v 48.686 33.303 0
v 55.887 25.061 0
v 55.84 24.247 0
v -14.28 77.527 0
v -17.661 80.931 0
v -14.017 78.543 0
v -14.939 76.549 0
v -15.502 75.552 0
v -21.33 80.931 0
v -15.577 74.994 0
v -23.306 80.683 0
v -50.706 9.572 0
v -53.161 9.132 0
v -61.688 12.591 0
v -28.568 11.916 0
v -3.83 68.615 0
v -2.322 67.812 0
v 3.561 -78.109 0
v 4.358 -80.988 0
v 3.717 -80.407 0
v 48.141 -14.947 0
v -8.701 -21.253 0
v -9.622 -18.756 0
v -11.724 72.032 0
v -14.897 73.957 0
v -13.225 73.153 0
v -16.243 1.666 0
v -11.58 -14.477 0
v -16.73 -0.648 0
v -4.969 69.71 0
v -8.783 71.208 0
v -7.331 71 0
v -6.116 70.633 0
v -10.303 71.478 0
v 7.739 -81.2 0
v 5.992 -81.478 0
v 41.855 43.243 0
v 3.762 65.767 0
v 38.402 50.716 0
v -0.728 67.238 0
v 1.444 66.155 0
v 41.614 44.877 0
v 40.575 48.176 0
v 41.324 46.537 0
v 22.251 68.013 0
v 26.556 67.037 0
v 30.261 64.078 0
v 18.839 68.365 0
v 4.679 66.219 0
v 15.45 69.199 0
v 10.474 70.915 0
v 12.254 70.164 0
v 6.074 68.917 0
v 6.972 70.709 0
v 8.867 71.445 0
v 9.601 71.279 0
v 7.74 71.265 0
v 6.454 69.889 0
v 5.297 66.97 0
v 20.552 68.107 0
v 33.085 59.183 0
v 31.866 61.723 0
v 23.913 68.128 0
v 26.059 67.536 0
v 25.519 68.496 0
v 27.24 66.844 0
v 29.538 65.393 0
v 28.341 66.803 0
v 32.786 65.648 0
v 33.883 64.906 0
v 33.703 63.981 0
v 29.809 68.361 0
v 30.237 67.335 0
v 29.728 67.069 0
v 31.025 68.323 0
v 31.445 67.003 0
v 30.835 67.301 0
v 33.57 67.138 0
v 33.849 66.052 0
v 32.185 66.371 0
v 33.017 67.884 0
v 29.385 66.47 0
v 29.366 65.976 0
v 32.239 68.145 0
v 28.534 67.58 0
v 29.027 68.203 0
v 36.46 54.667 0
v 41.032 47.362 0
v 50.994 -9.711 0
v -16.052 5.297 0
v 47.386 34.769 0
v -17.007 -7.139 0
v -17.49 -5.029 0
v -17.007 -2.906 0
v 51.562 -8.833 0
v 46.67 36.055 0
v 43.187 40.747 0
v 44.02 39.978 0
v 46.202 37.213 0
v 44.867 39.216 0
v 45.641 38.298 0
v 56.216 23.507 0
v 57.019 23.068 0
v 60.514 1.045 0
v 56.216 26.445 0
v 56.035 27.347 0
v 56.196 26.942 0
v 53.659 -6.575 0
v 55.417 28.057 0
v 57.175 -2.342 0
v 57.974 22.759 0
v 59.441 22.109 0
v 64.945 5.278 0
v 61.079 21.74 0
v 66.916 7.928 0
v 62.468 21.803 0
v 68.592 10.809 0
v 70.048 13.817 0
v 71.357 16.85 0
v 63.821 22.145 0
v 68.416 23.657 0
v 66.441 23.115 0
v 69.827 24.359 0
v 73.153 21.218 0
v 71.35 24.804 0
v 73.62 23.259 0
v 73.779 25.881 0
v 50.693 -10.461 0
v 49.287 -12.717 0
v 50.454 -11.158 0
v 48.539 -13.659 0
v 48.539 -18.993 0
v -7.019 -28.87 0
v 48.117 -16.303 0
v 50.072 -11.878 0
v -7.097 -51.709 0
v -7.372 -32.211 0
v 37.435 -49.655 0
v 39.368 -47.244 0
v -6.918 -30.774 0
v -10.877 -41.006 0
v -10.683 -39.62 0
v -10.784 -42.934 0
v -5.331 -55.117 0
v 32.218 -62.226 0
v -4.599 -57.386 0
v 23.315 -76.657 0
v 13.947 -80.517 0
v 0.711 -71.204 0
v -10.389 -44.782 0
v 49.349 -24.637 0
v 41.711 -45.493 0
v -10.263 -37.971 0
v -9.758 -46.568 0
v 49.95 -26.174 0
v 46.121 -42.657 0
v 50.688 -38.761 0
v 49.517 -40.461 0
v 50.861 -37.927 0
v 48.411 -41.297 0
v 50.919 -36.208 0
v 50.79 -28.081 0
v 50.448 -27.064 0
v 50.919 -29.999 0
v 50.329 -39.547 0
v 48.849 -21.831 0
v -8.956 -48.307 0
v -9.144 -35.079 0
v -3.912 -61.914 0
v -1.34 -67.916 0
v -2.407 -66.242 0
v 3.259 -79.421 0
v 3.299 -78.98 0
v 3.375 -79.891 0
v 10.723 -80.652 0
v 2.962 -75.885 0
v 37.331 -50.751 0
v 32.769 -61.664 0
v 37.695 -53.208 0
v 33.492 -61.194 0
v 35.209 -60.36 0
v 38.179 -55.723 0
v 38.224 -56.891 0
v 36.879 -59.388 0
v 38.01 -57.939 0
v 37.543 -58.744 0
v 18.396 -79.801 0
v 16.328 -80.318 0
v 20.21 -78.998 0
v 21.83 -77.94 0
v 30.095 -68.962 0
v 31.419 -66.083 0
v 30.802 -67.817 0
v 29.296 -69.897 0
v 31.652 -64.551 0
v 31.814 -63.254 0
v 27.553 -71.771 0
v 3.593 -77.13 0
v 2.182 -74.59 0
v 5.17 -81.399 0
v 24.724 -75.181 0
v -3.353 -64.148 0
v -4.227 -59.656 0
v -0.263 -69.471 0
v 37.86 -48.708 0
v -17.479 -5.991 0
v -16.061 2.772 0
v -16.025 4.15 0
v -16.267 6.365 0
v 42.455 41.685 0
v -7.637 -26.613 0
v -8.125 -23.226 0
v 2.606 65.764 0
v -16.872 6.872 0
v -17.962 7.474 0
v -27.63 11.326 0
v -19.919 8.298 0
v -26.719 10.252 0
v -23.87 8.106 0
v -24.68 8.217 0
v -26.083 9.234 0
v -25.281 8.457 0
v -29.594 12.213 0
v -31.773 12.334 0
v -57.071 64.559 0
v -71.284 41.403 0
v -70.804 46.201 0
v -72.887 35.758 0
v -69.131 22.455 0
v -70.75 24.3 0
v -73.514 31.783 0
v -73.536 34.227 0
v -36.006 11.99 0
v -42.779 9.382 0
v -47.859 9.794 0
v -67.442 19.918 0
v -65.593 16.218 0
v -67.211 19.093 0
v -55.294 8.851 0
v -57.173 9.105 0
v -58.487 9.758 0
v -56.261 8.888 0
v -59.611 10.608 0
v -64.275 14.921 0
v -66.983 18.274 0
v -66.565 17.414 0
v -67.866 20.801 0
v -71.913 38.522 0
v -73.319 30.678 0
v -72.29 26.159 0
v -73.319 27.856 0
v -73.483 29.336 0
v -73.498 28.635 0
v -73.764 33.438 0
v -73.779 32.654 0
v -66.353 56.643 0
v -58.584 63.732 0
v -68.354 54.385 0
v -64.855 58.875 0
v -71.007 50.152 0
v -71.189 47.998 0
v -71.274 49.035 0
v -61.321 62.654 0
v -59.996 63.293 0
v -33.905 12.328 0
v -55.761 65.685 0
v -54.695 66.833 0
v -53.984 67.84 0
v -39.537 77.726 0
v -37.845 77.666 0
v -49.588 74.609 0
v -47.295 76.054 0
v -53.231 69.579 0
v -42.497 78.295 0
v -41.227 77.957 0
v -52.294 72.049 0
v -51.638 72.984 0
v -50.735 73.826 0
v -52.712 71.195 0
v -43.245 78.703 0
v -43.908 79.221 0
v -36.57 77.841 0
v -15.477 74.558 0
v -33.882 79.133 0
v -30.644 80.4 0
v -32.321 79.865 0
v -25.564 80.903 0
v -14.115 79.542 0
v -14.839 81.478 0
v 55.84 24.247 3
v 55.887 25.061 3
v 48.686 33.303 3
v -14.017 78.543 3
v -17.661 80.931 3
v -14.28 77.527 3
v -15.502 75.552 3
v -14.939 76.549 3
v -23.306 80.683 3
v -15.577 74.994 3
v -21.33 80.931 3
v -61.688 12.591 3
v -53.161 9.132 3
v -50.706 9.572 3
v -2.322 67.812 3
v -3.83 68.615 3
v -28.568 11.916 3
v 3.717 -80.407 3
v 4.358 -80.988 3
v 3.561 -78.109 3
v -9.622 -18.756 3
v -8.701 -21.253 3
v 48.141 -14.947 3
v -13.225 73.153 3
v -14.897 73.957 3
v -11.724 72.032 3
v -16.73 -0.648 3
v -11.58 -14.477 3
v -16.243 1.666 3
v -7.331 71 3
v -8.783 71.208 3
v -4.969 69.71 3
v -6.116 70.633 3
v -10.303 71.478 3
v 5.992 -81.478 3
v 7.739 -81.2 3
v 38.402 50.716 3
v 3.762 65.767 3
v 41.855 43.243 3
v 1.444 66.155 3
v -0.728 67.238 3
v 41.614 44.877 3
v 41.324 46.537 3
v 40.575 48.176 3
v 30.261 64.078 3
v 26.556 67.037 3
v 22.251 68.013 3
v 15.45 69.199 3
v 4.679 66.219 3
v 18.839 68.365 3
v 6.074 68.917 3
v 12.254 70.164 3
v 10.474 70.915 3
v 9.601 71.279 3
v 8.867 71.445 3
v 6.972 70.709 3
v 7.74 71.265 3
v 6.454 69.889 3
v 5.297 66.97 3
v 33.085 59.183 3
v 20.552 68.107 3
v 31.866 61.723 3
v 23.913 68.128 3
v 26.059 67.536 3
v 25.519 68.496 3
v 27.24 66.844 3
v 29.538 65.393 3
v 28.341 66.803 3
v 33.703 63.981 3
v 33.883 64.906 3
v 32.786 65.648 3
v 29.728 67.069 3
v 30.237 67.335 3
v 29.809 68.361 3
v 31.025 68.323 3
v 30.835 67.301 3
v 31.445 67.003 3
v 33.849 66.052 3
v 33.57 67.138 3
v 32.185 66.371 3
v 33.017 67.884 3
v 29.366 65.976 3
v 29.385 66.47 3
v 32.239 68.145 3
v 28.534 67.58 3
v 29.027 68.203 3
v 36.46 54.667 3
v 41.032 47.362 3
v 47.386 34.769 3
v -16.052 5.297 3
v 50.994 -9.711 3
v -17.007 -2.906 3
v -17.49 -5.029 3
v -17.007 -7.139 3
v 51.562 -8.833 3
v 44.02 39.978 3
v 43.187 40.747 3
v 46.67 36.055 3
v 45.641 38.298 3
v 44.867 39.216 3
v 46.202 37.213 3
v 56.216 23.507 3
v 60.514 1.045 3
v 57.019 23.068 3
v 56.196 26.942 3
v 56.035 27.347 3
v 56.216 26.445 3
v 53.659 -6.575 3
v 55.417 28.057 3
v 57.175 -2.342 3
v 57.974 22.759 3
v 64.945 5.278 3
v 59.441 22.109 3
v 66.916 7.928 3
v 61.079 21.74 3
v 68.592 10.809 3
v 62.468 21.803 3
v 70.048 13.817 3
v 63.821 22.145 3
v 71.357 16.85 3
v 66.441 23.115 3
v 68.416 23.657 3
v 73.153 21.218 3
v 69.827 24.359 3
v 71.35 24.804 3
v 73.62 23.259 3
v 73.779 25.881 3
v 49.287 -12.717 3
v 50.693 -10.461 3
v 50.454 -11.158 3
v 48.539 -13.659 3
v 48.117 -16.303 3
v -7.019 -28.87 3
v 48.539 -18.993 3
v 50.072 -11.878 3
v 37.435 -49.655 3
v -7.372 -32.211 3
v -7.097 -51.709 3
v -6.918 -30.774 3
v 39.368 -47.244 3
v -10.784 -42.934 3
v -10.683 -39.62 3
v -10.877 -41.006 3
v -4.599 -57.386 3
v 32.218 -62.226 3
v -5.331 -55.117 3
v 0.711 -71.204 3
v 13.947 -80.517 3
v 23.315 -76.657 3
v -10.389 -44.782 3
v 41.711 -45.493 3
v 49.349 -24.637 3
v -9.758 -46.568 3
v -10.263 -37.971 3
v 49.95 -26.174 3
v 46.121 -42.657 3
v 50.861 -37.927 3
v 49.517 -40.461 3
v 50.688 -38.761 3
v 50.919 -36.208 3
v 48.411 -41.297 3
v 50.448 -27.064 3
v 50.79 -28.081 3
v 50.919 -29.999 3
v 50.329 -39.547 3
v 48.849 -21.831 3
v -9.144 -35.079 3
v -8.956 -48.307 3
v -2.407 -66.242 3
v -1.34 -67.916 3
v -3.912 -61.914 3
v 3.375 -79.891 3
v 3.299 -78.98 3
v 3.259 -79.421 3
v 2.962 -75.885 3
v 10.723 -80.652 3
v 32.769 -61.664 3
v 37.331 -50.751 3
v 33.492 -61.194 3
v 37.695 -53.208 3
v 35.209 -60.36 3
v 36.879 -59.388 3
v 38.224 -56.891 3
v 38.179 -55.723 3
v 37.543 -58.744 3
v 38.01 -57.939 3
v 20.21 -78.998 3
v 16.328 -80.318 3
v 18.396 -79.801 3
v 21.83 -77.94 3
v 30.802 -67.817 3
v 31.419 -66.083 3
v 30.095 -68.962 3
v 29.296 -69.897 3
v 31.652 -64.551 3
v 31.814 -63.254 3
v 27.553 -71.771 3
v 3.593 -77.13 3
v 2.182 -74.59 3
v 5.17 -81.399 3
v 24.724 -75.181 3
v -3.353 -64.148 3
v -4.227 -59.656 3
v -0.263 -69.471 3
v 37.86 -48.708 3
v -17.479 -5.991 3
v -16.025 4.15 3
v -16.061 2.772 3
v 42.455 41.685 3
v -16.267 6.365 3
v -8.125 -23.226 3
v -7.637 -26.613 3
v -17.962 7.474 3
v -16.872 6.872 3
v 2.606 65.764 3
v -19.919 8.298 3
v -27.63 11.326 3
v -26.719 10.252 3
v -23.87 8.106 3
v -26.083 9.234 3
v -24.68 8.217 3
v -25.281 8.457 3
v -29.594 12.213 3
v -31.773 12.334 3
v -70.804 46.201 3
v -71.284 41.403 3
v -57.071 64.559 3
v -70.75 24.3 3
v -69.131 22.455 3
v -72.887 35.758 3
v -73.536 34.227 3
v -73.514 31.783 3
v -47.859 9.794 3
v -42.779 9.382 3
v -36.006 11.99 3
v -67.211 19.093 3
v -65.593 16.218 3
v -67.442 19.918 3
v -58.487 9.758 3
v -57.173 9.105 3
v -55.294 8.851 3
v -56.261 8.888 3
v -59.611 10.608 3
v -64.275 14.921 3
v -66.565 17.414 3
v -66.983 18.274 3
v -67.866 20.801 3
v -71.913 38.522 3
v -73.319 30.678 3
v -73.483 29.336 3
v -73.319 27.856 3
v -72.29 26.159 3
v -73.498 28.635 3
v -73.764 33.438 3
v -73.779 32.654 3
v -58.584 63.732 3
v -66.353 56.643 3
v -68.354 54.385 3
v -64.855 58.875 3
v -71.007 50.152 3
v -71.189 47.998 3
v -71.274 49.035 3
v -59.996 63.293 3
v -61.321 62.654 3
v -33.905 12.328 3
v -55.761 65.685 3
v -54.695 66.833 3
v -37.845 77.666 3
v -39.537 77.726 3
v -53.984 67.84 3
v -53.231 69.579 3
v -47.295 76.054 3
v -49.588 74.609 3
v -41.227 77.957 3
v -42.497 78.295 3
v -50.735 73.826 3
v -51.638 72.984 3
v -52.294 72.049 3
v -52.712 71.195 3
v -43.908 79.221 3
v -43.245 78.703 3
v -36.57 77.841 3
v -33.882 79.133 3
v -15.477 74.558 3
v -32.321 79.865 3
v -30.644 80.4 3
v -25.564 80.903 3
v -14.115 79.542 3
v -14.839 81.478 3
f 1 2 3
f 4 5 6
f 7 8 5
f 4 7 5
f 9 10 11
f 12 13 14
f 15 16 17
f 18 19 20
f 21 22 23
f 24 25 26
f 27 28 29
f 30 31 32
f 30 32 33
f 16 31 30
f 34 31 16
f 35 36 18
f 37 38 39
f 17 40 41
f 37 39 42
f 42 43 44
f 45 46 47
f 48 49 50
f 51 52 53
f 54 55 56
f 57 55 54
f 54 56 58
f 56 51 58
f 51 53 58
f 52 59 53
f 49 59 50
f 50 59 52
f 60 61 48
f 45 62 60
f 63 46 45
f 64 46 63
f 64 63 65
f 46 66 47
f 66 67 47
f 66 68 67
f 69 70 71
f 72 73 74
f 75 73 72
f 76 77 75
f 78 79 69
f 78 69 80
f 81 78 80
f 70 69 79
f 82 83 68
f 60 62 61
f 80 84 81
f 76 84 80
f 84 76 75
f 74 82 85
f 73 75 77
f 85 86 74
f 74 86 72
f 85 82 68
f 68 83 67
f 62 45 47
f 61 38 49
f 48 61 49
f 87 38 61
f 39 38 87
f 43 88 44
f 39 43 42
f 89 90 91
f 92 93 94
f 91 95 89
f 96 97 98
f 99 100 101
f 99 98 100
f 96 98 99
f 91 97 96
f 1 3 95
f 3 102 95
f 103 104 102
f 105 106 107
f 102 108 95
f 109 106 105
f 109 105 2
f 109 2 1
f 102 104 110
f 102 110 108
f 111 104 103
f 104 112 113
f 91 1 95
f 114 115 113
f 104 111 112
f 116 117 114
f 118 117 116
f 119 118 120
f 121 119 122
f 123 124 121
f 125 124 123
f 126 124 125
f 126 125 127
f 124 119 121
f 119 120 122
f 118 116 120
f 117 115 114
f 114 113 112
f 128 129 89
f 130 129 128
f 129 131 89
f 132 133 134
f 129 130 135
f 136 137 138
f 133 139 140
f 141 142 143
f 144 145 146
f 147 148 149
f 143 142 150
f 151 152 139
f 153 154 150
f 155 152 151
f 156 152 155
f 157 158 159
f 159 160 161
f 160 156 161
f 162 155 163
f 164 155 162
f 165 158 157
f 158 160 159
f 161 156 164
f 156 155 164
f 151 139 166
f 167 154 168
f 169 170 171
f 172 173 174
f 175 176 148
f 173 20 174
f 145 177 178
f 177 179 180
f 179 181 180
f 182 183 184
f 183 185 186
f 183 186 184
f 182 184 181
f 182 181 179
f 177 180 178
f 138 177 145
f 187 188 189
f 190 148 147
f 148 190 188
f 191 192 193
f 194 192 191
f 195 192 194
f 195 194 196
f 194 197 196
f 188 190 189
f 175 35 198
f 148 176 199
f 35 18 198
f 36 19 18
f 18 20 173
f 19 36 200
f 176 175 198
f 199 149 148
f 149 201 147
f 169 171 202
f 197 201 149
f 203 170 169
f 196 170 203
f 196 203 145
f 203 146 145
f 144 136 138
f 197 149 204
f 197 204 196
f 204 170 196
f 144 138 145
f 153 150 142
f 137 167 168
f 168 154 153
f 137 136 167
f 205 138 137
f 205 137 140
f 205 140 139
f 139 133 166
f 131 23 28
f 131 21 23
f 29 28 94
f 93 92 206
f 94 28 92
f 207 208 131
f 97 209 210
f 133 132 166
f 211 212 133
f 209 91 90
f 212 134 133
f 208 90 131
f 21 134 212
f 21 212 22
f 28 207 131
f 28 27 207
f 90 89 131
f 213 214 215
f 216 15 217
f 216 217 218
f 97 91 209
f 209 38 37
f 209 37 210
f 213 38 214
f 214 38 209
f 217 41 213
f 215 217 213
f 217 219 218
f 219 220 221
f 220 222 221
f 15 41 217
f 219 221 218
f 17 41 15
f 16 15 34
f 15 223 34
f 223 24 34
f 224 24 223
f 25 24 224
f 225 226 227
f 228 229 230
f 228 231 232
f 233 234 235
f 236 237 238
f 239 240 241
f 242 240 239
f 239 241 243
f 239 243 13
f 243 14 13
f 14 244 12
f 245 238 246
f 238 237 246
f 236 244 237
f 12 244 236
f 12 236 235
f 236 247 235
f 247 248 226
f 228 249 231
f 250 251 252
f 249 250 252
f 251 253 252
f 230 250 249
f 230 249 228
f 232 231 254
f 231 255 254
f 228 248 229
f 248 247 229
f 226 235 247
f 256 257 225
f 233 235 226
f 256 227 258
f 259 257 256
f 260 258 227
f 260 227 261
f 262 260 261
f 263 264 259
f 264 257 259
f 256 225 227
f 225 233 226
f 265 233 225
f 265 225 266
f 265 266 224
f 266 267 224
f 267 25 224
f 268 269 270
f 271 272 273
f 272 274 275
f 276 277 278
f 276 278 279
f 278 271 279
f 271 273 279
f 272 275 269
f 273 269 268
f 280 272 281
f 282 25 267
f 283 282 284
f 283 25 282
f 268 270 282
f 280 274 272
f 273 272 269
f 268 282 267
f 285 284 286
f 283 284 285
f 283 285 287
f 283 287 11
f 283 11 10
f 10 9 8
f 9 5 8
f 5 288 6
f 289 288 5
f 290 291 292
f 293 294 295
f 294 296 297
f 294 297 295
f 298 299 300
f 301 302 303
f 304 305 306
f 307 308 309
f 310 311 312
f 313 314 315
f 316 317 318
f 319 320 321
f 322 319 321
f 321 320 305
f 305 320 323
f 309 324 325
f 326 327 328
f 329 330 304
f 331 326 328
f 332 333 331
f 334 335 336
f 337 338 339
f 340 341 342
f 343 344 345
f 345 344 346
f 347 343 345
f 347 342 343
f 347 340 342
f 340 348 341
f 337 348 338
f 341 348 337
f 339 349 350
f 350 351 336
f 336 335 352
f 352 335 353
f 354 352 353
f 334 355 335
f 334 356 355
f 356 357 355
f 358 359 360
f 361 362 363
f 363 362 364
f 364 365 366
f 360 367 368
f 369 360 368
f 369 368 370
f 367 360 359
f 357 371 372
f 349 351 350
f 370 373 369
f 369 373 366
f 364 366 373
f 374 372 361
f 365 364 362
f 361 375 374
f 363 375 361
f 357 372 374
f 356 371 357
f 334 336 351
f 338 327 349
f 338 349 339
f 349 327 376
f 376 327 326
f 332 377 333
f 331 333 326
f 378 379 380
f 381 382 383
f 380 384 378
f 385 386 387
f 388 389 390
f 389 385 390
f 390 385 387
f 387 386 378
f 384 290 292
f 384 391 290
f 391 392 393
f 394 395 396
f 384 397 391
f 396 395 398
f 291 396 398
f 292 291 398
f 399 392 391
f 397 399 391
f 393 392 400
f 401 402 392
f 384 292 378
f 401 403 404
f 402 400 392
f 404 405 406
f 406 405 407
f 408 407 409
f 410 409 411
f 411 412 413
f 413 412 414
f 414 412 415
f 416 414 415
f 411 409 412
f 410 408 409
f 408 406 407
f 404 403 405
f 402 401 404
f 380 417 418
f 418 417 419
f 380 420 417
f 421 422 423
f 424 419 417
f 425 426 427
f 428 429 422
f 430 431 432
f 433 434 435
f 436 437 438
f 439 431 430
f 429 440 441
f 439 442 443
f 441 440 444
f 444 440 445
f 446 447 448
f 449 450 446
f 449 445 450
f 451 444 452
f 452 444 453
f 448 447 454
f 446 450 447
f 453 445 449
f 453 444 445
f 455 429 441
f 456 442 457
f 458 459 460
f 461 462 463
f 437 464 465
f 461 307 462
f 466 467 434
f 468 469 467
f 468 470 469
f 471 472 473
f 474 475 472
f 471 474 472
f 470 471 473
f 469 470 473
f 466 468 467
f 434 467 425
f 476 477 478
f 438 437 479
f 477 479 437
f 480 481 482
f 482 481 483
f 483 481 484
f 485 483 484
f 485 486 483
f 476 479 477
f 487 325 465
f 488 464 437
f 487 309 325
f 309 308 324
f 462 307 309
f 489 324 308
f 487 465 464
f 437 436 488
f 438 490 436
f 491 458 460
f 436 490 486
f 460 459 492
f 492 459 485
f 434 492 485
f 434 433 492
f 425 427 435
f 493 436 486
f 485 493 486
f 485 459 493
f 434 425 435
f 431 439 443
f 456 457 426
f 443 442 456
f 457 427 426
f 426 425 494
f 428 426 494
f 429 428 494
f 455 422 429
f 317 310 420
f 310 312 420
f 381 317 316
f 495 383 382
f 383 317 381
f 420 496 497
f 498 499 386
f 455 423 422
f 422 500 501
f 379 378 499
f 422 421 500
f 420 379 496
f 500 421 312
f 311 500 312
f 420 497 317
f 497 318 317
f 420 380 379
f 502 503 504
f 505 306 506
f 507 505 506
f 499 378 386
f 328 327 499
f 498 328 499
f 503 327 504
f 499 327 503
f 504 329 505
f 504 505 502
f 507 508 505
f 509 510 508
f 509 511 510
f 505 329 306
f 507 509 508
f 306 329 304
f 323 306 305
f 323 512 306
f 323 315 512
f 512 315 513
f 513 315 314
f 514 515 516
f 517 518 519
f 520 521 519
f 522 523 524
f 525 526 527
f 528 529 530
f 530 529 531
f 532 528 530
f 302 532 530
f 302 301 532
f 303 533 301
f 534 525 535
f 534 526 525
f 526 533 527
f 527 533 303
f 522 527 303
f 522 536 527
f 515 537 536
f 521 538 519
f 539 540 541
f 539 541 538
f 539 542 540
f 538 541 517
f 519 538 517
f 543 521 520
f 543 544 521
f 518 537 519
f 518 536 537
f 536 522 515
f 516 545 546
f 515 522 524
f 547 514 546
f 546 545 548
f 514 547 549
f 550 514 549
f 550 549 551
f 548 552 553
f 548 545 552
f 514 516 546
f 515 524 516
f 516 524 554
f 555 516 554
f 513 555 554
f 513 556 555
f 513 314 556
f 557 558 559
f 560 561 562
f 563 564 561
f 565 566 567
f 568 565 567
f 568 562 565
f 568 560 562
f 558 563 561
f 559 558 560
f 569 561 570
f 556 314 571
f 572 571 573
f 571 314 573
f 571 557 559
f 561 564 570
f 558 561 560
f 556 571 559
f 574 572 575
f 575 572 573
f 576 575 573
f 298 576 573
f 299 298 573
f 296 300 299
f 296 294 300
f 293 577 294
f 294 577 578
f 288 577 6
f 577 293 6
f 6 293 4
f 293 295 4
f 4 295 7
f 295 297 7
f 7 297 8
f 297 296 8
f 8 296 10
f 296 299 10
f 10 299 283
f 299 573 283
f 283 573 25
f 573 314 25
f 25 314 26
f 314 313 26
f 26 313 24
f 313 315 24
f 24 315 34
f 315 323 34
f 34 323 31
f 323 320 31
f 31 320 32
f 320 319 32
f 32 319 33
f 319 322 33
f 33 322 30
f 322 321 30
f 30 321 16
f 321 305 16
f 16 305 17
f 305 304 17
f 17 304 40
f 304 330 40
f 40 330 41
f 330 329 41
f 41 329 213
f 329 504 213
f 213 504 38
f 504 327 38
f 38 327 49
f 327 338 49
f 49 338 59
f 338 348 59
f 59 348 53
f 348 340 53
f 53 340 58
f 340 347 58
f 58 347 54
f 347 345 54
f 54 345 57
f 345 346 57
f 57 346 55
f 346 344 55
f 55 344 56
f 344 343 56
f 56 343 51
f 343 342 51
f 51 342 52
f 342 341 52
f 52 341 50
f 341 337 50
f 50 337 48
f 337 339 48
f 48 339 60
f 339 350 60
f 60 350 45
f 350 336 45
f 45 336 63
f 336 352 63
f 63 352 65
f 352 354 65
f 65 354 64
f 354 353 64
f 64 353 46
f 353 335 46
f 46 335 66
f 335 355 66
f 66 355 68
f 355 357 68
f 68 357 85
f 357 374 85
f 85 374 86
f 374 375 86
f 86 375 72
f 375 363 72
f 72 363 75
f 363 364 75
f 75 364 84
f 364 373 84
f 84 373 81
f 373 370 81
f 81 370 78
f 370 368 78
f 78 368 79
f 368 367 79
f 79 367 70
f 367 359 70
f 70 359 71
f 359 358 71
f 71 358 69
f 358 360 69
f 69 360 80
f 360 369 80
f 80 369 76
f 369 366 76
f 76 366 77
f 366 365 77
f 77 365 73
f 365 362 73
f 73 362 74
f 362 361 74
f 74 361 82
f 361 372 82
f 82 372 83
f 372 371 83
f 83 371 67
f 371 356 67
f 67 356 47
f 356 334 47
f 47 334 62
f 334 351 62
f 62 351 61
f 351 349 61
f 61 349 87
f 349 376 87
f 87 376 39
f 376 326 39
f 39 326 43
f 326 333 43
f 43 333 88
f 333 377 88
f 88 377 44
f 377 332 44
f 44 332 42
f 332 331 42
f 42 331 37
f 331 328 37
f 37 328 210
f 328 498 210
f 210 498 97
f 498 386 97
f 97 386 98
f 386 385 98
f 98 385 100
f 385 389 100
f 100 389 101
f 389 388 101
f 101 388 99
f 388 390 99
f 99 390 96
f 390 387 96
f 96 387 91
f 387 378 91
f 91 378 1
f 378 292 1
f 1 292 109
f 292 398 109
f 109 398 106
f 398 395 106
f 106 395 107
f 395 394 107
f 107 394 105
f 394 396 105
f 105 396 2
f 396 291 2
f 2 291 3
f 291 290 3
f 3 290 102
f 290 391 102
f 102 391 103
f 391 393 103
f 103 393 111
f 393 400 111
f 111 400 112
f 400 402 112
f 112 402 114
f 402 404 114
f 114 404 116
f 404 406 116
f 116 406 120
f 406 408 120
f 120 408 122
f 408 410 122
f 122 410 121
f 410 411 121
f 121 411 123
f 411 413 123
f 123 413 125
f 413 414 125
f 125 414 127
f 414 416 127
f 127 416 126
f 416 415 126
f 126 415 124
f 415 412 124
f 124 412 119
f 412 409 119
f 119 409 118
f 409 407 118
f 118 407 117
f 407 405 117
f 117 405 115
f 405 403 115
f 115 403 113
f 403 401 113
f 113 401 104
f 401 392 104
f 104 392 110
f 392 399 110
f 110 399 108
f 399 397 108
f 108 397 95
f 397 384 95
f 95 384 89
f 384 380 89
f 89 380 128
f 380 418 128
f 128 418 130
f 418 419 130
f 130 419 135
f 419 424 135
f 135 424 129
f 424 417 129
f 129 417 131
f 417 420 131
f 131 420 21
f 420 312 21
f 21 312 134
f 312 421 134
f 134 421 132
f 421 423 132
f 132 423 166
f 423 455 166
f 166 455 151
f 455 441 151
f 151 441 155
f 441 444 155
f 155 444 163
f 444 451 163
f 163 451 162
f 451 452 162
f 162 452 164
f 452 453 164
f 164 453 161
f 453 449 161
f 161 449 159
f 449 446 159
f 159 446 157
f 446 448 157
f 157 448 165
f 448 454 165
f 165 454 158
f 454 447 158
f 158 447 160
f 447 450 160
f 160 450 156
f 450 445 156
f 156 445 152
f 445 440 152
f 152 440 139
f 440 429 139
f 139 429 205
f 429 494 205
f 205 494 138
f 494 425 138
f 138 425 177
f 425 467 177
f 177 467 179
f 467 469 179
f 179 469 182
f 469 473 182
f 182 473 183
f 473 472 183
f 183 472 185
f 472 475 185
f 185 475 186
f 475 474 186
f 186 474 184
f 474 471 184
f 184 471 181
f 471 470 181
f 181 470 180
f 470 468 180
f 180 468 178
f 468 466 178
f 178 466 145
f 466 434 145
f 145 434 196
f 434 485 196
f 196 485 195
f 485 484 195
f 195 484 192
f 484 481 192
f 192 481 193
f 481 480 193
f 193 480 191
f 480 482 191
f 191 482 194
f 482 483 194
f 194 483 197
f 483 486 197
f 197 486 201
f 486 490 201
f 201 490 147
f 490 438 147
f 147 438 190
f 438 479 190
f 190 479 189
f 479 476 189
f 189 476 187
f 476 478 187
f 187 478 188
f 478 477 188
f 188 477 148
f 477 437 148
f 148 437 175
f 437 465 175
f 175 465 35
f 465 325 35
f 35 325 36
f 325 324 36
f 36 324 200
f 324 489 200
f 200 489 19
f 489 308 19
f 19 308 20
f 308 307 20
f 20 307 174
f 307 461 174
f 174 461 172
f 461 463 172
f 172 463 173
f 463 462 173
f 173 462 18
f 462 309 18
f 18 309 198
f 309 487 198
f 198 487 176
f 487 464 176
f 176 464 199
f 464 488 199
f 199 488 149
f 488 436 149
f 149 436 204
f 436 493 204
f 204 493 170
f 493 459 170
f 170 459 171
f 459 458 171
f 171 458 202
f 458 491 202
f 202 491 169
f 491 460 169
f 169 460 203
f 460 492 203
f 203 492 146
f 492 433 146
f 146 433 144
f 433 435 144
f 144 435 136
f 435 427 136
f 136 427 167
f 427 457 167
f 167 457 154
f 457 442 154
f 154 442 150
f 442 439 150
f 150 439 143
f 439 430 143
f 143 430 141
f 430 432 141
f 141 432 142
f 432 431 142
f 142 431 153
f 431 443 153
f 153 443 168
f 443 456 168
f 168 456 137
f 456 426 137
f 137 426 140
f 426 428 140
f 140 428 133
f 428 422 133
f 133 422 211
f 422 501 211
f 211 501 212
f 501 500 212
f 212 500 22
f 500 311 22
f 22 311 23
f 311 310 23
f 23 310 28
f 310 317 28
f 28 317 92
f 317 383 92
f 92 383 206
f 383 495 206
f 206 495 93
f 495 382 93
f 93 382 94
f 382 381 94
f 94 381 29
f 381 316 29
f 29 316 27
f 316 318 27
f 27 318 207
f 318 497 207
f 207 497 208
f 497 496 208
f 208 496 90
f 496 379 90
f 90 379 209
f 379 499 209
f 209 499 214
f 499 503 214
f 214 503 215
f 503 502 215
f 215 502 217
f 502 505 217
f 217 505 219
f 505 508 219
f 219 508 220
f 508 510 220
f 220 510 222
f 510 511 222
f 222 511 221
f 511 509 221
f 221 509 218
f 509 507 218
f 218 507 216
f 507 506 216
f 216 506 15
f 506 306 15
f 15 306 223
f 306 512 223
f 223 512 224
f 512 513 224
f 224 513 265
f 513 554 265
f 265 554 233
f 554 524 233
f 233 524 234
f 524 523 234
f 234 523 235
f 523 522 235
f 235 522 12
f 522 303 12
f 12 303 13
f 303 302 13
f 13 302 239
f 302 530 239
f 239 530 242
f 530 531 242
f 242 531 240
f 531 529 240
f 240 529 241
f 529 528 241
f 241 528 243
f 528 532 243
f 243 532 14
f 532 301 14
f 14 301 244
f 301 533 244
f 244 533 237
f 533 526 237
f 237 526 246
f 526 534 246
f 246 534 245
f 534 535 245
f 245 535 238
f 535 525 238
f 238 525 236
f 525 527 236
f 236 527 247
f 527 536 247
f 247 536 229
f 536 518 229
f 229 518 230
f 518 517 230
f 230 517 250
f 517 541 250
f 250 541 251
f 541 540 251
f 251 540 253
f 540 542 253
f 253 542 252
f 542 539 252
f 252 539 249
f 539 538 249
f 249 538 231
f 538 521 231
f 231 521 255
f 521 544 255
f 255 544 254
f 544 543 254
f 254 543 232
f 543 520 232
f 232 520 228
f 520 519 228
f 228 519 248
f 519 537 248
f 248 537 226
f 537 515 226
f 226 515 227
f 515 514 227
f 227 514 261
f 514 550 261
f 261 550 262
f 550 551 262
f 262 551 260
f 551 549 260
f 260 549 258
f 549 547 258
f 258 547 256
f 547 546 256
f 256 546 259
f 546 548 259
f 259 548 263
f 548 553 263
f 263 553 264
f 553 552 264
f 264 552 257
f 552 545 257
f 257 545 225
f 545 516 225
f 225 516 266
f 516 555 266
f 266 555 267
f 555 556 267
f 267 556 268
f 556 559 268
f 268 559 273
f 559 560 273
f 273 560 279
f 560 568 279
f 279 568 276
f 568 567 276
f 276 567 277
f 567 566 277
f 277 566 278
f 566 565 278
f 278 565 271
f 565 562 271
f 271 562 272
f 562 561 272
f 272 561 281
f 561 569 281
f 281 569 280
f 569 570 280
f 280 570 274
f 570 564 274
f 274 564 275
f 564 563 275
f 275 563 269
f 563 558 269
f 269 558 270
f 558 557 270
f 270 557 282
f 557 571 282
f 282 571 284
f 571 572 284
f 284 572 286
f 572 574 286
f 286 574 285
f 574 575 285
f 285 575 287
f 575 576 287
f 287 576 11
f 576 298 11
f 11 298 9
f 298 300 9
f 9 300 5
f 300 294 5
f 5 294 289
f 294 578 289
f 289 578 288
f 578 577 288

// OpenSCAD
// Module names are of the form poly_<inkscape-path-id>().  As a result,
// you can associate a polygon in this OpenSCAD program with the corresponding
// SVG element in the Inkscape document by looking for the XML element with
// the attribute id="inkscape-path-id".



module africa(h=3)
{
  scale([25.4/90, -25.4/90, 1]) union()
  {
    linear_extrude(height=h)
      polygon([[-150.580000,-277.423125],[-146.079531,-276.225156],[-140.091250,-275.406875],[-134.097344,-275.194219],[-129.580000,-275.813125],[-120.055000,-280.393125],[-114.524688,-282.987813],[-108.580000,-284.883125],[-90.580000,-286.663125],[-82.580000,-285.883125],[-75.580000,-286.763125],[-62.580000,-286.763125],[-52.580000,-288.703125],[-50.015000,-281.841875],[-49.666250,-278.301094],[-50.600000,-274.703125],[-52.933750,-271.236875],[-54.930000,-267.703125],[-55.193555,-265.725156],[-54.839063,-264.181250],[-52.785000,-262.050625],[-46.860000,-259.203125],[-41.540000,-255.233125],[-36.507344,-253.268438],[-31.121250,-252.310625],[-25.977031,-251.574063],[-21.670000,-250.273125],[-17.605000,-247.005625],[-13.570000,-243.123125],[-8.228750,-240.278125],[-2.580000,-238.243125],[5.116250,-234.408125],[9.233906,-233.020312],[13.330000,-233.033125],[16.578496,-234.635938],[18.767969,-237.296250],[21.523750,-244.195625],[22.867012,-247.637813],[24.705156,-250.543750],[27.426660,-252.515000],[31.420000,-253.153125],[34.020625,-252.561875],[37.112500,-251.273125],[43.420000,-248.613125],[54.744844,-245.195000],[66.751250,-242.238125],[72.823418,-241.322891],[78.842031,-240.991250],[84.732441,-241.399297],[90.420000,-242.703125],[92.335469,-239.300469],[94.096250,-237.531875],[96.518906,-236.848906],[100.420000,-236.703125],[101.106250,-239.456875],[102.850000,-241.663125],[105.623281,-242.223437],[109.931250,-242.088125],[114.233594,-241.457812],[116.990000,-240.533125],[118.950313,-237.889844],[119.937500,-234.041875],[120.058437,-229.982031],[119.420000,-226.703125],[116.170000,-232.609375],[114.042500,-235.172969],[111.420000,-237.413125],[109.258437,-238.469219],[107.140000,-238.586875],[105.336562,-237.645156],[104.120000,-235.523125],[104.051445,-233.774590],[104.660937,-231.706719],[107.225000,-227.049375],[112.910000,-218.703125],[117.230000,-209.703125],[129.190000,-193.703125],[136.070000,-179.703125],[143.770000,-170.703125],[145.389180,-167.818691],[146.422187,-164.894531],[147.452500,-159.011875],[148.306562,-153.224844],[150.430000,-147.703125],[153.026562,-144.378281],[155.977500,-141.654375],[158.977187,-138.954844],[161.720000,-135.703125],[163.706875,-131.857500],[165.367500,-127.753125],[167.901875,-123.198750],[172.510000,-118.003125],[196.360000,-99.413125],[198.547500,-96.899375],[199.119062,-95.462969],[199.190000,-93.703125],[198.023750,-88.798125],[197.858281,-85.915312],[199.190000,-83.293125],[202.035000,-81.735625],[205.420000,-80.643125],[210.616250,-78.339375],[216.420000,-77.033125],[221.343438,-77.255469],[226.137500,-78.466875],[235.420000,-81.903125],[242.420000,-83.823125],[247.420000,-86.313125],[252.815000,-87.886875],[261.420000,-91.703125],[260.857031,-82.415469],[259.203750,-75.181875],[252.840000,-59.703125],[248.200156,-48.958594],[243.043750,-38.299375],[237.105469,-28.092031],[230.120000,-18.703125],[214.420000,-3.703125],[202.590000,8.296875],[190.130000,23.296875],[182.700000,31.296875],[180.686719,34.408750],[179.621250,37.066875],[178.775156,39.537500],[177.420000,42.086875],[174.637500,45.061875],[171.990000,48.396875],[170.576719,52.960156],[170.493750,57.768125],[171.990000,67.296875],[173.087500,77.353125],[174.860000,87.296875],[176.987344,92.743437],[178.753750,95.896875],[179.963281,99.500312],[180.420000,106.296875],[180.420000,128.296875],[180.215000,134.388125],[179.604375,137.343281],[178.330000,140.126875],[175.454687,143.364688],[171.535000,146.326875],[163.420000,151.146875],[147.795000,161.195625],[139.491250,167.401719],[134.150000,172.586875],[132.644941,175.943496],[132.273906,179.825469],[133.563750,188.533125],[135.279219,197.445156],[135.440215,201.582598],[134.680000,205.296875],[133.025547,208.148828],[130.675000,210.429375],[124.757500,213.874375],[118.671250,216.828125],[116.109766,218.494609],[114.160000,220.486875],[112.725937,224.129219],[112.152500,228.723125],[111.327812,234.151406],[109.140000,240.296875],[106.635625,244.352031],[103.805000,247.665625],[97.630000,254.306875],[87.605312,266.389844],[82.611602,271.620801],[77.350000,276.165625],[71.610273,279.914980],[65.182187,282.759531],[57.855508,284.589941],[49.420000,285.296875],[37.996250,285.775625],[27.420000,287.716875],[21.231250,288.703125],[18.320156,288.421406],[15.440000,286.966875],[13.171465,284.906621],[11.957969,283.077344],[11.547676,281.413770],[11.688750,279.850625],[12.617656,276.764531],[12.730000,273.296875],[10.496250,268.883125],[7.730000,264.296875],[2.520000,252.296875],[-0.930938,246.156094],[-4.747500,240.648125],[-8.530313,234.714531],[-11.880000,227.296875],[-13.862656,219.380312],[-14.976250,211.379375],[-16.294219,203.337188],[-18.890000,195.296875],[-25.145469,183.220625],[-31.733750,171.166875],[-34.577012,165.005469],[-36.812656,158.678125],[-38.210410,152.127656],[-38.540000,145.296875],[-37.854844,140.384375],[-36.366250,134.541875],[-32.400000,124.296875],[-26.122500,114.133125],[-24.510938,109.040469],[-24.870000,102.296875],[-27.060000,94.296875],[-28.790000,82.296875],[-30.831875,75.304375],[-34.092500,66.459375],[-41.030000,51.296875],[-60.260000,25.296875],[-61.932031,21.229062],[-61.973750,17.819375],[-60.260000,10.296875],[-59.280000,2.296875],[-57.553750,-5.903125],[-56.907656,-9.822187],[-56.780000,-14.703125],[-56.876250,-18.770625],[-57.640000,-22.553125],[-59.782813,-24.350469],[-63.645000,-26.484375],[-70.580000,-29.403125],[-84.580000,-28.723125],[-87.447168,-29.114961],[-89.579219,-29.965937],[-92.421250,-32.718125],[-94.672656,-36.325312],[-97.900000,-40.133125],[-101.224531,-42.220937],[-104.861250,-43.275625],[-112.580000,-43.703125],[-120.136250,-43.681875],[-127.580000,-42.483125],[-151.580000,-33.243125],[-169.580000,-34.703125],[-179.666563,-33.916875],[-188.367500,-32.358125],[-195.924688,-31.361875],[-199.349961,-31.491875],[-202.580000,-32.263125],[-207.238594,-34.573906],[-211.221250,-37.586875],[-218.580000,-44.613125],[-227.745000,-52.869375],[-232.417500,-57.464844],[-235.860000,-61.703125],[-237.339688,-64.750937],[-238.150000,-67.650625],[-238.967813,-70.576562],[-240.470000,-73.703125],[-244.952656,-79.565469],[-250.688750,-86.101875],[-256.145469,-92.688906],[-259.790000,-98.703125],[-260.427031,-101.462344],[-260.371250,-103.946875],[-259.790000,-108.703125],[-260.481250,-112.615625],[-261.420000,-115.703125],[-261.367813,-118.479375],[-260.560000,-121.278125],[-258.260000,-126.703125],[-254.808750,-136.496875],[-252.580000,-146.703125],[-250.880000,-163.703125],[-252.245000,-170.073125],[-252.545000,-173.746563],[-251.600000,-177.703125],[-242.200000,-192.703125],[-235.110000,-200.703125],[-229.800000,-208.613125],[-217.280000,-222.003125],[-212.583750,-224.265625],[-207.580000,-225.823125],[-202.220000,-228.750625],[-197.580000,-232.743125],[-193.802637,-236.811113],[-191.282344,-240.379531],[-188.613750,-246.539375],[-186.775781,-252.266094],[-185.293770,-255.293105],[-182.970000,-258.603125],[-179.770781,-261.589844],[-175.706250,-264.361875],[-167.580000,-269.483125],[-155.580000,-280.703125],[-153.230000,-278.868125],[-150.580000,-277.423125]]);
  }
}

africa();
